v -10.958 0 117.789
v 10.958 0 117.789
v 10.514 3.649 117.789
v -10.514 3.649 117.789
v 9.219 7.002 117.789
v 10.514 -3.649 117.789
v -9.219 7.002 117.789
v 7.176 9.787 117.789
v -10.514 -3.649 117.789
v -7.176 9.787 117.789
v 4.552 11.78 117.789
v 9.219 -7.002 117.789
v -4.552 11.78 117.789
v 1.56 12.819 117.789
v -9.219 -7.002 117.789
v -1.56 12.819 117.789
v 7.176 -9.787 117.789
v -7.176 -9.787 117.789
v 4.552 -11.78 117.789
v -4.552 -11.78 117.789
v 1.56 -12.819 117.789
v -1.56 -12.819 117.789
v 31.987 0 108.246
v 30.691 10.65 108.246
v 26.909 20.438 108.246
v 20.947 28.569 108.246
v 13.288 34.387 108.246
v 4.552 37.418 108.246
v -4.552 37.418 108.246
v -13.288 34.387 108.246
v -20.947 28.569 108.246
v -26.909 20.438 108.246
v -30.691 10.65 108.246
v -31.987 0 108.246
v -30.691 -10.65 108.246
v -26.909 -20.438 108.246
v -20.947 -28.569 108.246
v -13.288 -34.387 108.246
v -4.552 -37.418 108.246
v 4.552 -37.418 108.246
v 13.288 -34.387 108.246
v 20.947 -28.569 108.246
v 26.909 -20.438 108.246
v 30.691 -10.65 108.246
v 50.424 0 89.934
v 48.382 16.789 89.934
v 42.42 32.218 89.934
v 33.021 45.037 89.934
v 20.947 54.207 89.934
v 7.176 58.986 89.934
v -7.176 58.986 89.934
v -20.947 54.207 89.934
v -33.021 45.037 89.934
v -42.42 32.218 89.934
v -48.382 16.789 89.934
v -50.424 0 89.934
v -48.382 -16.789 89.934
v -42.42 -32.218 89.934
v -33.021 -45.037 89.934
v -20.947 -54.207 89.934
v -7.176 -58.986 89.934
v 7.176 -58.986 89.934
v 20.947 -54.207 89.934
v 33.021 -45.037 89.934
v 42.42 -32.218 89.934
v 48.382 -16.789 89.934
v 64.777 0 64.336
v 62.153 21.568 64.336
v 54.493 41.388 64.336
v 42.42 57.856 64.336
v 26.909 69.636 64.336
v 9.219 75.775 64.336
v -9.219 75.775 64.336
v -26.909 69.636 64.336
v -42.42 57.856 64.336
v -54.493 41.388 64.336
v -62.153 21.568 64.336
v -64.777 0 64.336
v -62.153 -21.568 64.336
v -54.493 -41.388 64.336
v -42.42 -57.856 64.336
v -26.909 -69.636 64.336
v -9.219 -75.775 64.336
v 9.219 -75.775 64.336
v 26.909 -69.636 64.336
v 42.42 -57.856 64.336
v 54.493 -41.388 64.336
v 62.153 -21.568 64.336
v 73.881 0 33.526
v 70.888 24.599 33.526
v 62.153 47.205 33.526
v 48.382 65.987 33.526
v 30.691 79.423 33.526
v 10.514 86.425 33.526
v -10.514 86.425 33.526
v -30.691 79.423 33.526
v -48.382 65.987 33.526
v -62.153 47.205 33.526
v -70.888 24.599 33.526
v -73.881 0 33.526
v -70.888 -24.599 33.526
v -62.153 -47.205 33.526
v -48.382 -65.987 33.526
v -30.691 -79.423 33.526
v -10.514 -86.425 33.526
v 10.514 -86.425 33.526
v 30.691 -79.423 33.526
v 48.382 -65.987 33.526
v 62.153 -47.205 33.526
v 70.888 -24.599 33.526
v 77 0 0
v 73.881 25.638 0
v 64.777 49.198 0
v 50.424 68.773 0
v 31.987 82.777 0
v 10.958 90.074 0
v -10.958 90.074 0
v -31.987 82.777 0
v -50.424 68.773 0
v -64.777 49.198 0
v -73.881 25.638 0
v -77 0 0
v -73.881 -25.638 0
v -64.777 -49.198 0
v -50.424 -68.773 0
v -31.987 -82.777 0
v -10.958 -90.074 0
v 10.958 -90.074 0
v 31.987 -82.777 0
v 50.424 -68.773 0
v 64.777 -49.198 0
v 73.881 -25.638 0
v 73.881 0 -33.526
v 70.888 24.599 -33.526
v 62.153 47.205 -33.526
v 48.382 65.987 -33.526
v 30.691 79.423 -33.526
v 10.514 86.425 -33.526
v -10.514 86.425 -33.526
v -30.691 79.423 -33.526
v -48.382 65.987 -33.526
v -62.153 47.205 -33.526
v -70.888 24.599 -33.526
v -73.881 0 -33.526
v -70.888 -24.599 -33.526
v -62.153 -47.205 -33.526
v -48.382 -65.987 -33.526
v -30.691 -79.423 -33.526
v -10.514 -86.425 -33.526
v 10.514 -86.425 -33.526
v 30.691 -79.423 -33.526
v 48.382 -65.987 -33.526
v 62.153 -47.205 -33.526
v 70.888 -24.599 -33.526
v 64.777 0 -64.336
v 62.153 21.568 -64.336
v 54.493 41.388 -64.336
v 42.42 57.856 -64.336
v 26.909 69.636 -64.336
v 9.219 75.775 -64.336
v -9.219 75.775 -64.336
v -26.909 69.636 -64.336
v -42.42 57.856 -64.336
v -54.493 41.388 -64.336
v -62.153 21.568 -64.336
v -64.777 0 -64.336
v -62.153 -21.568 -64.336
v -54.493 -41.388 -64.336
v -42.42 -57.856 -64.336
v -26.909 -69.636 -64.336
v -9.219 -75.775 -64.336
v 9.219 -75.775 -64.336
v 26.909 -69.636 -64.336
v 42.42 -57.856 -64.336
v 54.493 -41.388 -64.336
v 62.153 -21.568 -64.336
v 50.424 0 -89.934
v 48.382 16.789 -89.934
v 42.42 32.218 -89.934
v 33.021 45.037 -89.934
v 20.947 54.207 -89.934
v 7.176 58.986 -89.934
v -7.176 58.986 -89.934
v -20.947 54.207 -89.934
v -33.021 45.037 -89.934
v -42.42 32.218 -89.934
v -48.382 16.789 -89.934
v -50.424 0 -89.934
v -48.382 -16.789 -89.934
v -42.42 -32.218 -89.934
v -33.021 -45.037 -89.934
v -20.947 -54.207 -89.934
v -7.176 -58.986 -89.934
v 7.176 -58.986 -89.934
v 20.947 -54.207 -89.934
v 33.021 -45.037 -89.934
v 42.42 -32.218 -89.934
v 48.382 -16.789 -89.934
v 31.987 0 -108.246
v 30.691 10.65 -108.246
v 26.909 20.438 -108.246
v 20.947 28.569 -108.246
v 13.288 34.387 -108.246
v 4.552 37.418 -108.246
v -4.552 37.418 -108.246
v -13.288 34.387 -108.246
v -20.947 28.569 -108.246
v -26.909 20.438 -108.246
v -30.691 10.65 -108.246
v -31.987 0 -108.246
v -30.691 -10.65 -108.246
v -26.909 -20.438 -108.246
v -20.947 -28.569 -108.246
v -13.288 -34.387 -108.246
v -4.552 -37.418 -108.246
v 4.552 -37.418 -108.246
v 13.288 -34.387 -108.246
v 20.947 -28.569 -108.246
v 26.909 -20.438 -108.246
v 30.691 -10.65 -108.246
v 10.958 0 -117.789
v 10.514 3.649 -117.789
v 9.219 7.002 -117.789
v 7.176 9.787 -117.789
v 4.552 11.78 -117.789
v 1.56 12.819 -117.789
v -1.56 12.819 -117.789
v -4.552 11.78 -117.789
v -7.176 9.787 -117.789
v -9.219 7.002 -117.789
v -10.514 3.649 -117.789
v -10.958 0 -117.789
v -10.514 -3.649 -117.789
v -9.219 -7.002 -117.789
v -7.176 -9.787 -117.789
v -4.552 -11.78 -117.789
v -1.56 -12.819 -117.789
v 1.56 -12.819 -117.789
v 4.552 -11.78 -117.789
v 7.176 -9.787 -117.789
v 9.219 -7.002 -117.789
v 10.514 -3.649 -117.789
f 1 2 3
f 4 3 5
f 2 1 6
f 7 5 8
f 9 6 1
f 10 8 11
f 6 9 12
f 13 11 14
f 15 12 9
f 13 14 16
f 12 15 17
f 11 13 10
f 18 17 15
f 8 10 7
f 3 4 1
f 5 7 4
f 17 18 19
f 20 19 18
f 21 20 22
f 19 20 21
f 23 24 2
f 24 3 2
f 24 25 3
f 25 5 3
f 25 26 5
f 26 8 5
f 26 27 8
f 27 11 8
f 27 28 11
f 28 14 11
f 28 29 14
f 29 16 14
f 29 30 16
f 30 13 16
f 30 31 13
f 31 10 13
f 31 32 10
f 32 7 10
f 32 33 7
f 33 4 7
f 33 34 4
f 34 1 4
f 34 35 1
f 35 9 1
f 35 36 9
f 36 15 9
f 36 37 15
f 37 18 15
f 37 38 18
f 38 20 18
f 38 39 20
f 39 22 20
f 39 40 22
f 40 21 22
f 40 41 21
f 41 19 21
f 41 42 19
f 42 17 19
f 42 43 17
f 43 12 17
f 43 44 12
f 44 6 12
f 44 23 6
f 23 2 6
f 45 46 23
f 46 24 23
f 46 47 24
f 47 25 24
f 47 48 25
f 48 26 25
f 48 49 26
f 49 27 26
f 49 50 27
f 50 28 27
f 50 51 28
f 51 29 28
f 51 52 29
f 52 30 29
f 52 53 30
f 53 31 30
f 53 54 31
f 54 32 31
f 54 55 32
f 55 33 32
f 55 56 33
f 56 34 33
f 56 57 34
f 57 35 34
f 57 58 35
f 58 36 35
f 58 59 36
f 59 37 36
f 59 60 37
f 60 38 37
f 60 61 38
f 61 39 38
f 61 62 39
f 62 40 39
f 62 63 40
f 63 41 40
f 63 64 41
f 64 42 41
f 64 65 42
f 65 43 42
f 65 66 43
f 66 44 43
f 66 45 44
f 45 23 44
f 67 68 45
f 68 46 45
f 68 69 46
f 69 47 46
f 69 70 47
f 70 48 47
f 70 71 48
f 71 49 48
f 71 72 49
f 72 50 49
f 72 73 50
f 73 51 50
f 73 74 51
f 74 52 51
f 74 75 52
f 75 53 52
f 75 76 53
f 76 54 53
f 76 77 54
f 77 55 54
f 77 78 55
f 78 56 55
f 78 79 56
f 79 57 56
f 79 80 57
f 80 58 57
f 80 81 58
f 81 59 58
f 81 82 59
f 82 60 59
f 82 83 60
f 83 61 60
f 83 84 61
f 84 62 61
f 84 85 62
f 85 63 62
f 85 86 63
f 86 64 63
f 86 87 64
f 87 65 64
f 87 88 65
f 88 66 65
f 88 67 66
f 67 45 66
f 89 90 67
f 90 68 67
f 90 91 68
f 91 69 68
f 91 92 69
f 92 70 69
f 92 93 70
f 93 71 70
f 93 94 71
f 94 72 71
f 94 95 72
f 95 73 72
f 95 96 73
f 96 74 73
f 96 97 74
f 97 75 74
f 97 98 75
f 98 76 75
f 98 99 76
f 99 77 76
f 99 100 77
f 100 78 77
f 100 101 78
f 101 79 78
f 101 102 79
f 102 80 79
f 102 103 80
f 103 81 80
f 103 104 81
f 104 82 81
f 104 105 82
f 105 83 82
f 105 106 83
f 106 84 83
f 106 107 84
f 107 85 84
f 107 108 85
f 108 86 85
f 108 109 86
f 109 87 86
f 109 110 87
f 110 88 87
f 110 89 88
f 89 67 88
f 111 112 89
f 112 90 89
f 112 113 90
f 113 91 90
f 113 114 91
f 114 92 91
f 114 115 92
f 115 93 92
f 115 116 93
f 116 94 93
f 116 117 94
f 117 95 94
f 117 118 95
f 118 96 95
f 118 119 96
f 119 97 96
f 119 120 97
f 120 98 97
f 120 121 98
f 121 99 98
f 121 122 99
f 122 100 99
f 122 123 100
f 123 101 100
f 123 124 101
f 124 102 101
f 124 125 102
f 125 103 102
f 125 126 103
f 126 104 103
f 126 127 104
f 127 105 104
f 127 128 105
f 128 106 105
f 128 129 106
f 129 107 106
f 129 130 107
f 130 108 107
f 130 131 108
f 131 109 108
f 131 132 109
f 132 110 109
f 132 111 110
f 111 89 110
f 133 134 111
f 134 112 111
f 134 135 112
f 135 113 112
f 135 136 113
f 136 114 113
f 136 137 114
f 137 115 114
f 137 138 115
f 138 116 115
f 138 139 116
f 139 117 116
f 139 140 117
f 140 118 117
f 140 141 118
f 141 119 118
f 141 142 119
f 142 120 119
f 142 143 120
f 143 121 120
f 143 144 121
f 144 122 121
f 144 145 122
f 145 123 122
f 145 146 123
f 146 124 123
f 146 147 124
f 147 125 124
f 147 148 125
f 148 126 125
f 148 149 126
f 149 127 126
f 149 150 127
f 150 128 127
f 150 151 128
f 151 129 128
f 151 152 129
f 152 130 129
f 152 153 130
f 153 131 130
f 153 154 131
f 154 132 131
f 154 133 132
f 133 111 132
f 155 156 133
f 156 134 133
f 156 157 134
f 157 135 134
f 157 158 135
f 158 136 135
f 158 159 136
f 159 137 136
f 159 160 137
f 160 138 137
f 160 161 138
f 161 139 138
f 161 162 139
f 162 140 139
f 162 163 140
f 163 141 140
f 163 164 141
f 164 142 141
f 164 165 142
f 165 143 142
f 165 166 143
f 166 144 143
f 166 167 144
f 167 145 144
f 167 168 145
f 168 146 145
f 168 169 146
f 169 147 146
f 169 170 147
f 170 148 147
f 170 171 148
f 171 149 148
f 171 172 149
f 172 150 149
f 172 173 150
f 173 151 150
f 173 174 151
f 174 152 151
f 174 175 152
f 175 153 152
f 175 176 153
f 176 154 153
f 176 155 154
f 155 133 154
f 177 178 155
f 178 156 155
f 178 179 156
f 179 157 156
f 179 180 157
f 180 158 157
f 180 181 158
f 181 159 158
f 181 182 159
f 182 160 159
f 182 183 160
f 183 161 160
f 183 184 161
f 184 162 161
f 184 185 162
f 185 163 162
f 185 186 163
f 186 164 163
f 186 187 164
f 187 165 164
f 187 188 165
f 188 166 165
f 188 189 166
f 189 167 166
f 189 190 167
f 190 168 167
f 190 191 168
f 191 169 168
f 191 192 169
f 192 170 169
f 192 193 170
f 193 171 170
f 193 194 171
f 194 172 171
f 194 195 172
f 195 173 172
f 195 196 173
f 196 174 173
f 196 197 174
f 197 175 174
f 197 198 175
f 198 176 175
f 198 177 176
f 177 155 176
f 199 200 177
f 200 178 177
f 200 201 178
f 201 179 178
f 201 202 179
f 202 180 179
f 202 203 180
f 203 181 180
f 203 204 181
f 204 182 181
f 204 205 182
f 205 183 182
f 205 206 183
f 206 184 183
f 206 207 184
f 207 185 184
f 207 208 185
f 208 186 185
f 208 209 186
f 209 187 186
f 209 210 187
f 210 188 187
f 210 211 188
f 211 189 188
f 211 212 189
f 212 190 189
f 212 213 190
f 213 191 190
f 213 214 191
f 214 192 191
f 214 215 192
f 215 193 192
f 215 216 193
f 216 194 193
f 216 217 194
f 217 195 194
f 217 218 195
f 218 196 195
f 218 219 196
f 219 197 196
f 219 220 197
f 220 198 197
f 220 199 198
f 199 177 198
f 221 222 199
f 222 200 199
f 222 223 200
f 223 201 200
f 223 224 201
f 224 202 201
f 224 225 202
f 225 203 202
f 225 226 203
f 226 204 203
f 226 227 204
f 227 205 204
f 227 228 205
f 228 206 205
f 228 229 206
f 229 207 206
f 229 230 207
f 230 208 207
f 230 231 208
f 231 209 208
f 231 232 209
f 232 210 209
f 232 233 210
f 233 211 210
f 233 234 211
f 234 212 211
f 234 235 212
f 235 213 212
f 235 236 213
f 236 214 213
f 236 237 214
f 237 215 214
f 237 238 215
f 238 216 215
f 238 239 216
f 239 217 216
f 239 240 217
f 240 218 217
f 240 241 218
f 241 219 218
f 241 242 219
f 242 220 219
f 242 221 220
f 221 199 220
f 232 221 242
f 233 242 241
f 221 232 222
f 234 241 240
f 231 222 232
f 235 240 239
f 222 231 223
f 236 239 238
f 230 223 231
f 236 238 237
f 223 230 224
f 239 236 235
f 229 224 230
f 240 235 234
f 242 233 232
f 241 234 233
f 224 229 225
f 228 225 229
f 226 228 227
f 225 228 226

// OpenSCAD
// Generated by SolidPython 1.0.1 on 2020-07-29 00:46:49


scale(v = [11, 13, 17]) {
	sphere(r = 7);
}
/***********************************************
*********      SolidPython code:      **********
************************************************
 
# import packages: SolidPython
from solid import *
from solid.utils import *
from itertools import chain, combinations, permutations


class Resize:

    def __init__(self, scad_file):
        self.scad_file = scad_file
        #self.scad_file = import_scad(scad_file)
        # cone/cylinder param:
        self.r1 = 0
        self.r2 = 0
        self.h = 0
        # rectangular prism param:
        self.w = 0
        self.l = 0
        # ellipse param:
        self.r = 0

    # import OpenScad code (file name corresponds to shape)


    # classify shape + parameters
    def assign(self, param1, param2, param3):
        if self.scad_file == 'cone.scad':
            self.r1 = param1
            self.r2 = param2
            self.h = param3
        elif self.scad_file == 'cylinder.scad':
            self.r1 = param1
            self.r2 = param2
            self.h = param3
        elif self.scad_file == 'rectangularPrism.scad':
            self.h = param1
            self.l = param2
            self.w = param3
        else:
            self.r = param1
            self.h = param2

    # resize parameters
    def iterate(self):
        x = range(3, 20, 2)
        i = 1
        if self.scad_file == 'cone.scad':
            tempList = list(permutations(x, 2))
            for temp in tempList:
                param1 = temp[0]
                param2 = temp[1]
                filepath = 'produced_scad_files/' + 'cone' + str(param1) + '_' + str(param2) + '_' + '.scad'
                scad_render_to_file(cylinder(h=param1, r1=param2, r2=0), filepath)

        elif self.scad_file == 'cylinder.scad':
            tempList = list(permutations(x, 3))
            for temp in tempList:
                param1 = temp[0]
                param2 = temp[1]
                filepath = 'produced_scad_files/' + 'cylinder' + str(param1) + '_' + str(param2) + '_' + '.scad'
                scad_render_to_file(cylinder(h=param1, r1=param2, r2=param2), filepath)

        elif self.scad_file == 'rectangularPrism.scad':
            tempList = list(permutations(x, 3))
            for temp in tempList:
                param1 = temp[0]
                param2 = temp[1]
                param3 = temp[2]
                filepath = 'produced_scad_files/' + 'rectangularPrism' + str(param1) + '_' + str(param2) + '_' + str(
                    param3) + '.scad'
                scad_render_to_file(cube(size=(param1, param2, param3)), filepath)

        elif self.scad_file == 'ellipse.scad':
            tempList = list(permutations(x, 4))
            for temp in tempList:
                param1 = temp[0]
                param2 = temp[1]
                param3 = temp[2]
                param4 = temp[3]
                filepath = 'produced_scad_files/' + 'ellipse' + str(param1) + '_' + str(param2) + '_' + str(param3) + '_' + str(param4) + '.scad'
                scad_render_to_file(scale([param1, param2, param3])(sphere(r=param4)), filepath)

    def render_to_scadfile(self):
        scad_render_to_file(scad, 'example.scad') 
 
************************************************/
